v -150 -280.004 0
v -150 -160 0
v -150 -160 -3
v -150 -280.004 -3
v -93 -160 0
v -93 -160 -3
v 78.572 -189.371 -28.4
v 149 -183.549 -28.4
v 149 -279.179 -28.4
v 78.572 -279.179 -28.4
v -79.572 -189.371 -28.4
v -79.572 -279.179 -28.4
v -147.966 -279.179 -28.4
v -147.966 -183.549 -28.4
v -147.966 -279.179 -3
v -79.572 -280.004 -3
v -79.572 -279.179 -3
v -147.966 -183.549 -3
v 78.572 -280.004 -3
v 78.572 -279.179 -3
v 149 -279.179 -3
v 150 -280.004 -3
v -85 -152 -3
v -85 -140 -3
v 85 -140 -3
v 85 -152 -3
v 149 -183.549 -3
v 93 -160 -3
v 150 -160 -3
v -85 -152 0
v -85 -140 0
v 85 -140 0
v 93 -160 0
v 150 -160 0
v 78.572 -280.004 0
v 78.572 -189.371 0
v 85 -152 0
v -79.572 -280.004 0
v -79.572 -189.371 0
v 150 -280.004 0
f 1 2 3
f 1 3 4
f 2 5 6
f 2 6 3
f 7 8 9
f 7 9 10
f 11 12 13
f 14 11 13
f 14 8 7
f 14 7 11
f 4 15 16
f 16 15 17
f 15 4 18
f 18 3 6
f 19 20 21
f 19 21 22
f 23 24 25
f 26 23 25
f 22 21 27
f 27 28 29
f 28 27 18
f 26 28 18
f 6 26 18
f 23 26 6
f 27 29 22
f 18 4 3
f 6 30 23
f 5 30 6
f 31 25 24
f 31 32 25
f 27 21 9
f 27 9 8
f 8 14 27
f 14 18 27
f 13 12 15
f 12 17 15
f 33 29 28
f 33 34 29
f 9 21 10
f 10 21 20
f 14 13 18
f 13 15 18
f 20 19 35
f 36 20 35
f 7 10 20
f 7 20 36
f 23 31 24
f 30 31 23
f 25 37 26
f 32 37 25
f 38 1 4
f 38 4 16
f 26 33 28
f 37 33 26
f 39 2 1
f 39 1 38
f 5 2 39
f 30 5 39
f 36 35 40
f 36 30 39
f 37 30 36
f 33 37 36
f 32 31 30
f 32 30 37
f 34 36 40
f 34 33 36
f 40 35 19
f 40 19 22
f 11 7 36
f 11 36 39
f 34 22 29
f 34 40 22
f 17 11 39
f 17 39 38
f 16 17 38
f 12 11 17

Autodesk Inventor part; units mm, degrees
ref_plane "YZ Plane" through (0, 0, 0) normal (1, 0, 0) x (0, 1, 0)
ref_plane "XZ Plane" through (0, 0, 0) normal (0, 1, 0) x (-1, 0, 0)
ref_plane "XY Plane" through (0, 0, 0) normal (0, 0, 1) x (1, 0, 0)
ref_plane "Work Plane1" through (0, 0, 0) normal (0, 0, 1) x (1, 0, 0)
sketch "Sketch1" plane through (0, 0, 0) normal (0, 0, 1) x (1, 0, 0)
  line L0 (93, -160) -> (85, -152) projected
  line L1 (150, -160) -> (93, -160) projected
  line L2 (150, -27.5) -> (150, -160) projected
  line L3 (110, -27.5) -> (150, -27.5) projected
  line L4 (110, 47.5) -> (110, -27.5) projected
  line L5 (150, 47.5) -> (110, 47.5) projected
  line L6 (150, 160) -> (150, 47.5) projected
  line L7 (-150, 160) -> (150, 160) projected
  line L8 (-150, 47.5) -> (-150, 160) projected
  line L9 (-110, 47.5) -> (-150, 47.5) projected
  line L10 (-110, -27.5) -> (-110, 47.5) projected
  line L11 (-150, -27.5) -> (-110, -27.5) projected
  line L12 (-150, -160) -> (-150, -27.5) projected
  line L13 (-93, -160) -> (-150, -160) projected
  line L14 (-85, -152) -> (-93, -160) projected
  line L15 (-85, -140) -> (-85, -152) projected
  line L16 (85, -140) -> (-85, -140) projected
  line L17 (85, -152) -> (85, -140) projected
  line L18 (-150, -280.0045) -> (150, -280.0045)
  line L19 (150, -280.0045) -> (150, -118.8161)
  line L20 (150, -118.8161) -> (-150, -118.8161)
  line L21 (-150, -118.8161) -> (-150, -280.0045)
  point P0 (0, 0)
extrude "Extrusion1" add sketch "Sketch1" against normal blind 3 contours L1 L19 L18 L21 L13 L14 L15 L16 L17 L0
sketch "Sketch2" plane through (0, 0, -3) normal (0, 0, -1) x (-1, 0, 0)
  line L0 (-149, -279.3573) -> (-149, -162.5589) projected
  line L1 (-79, -279.1787) -> (-149, -279.1787) projected
  line L2 (-149, -279.1787) -> (147.9655, -279.1787)
  line L3 (147.9655, -279.1787) -> (147.9655, -183.5488)
  line L4 (147.9655, -183.5488) -> (-149, -183.5488)
  line L5 (-149, -183.5488) -> (-149, -279.1787)
  point P0 (0, 0)
  point P1 (-149, -183.5488)
extrude "Extrusion2" add sketch "Sketch2" along normal blind 25.4
sketch "Sketch3" plane through (0, 0, -28.4) normal (0, 0, -1) x (-1, 0, 0)
  line L0 (75.5, -193.4434) -> (-74.5, -193.4434) projected
  line L1 (-74.5, -193.4434) -> (-74.5, -316.9258) projected
  line L2 (-74.5, -316.9258) -> (75.5, -316.9258) projected
  line L3 (75.5, -316.9258) -> (75.5, -193.4434) projected
  line L4 (63.5, -304.9759) -> (-62.5, -304.9759) projected
  line L5 (-62.5, -304.9759) -> (-62.5, -205.3933) projected
  line L6 (-62.5, -205.3933) -> (63.5, -205.3933) projected
  line L7 (63.5, -205.3933) -> (63.5, -304.9759) projected
  line L8 (-78.5724, -320.9982) -> (-78.5724, -189.371)
  line L9 (-78.5724, -189.371) -> (79.5724, -189.371)
  line L10 (79.5724, -189.371) -> (79.5724, -320.9982)
  line L11 (79.5724, -320.9982) -> (-78.5724, -320.9982)
  point P0 (0, 0)
extrude "Extrusion3" cut sketch "Sketch3" against normal blind 50.8 contours L3 L2 L1 L0 | L4 L5 L6 L7 | L8 L9 L10 L11
